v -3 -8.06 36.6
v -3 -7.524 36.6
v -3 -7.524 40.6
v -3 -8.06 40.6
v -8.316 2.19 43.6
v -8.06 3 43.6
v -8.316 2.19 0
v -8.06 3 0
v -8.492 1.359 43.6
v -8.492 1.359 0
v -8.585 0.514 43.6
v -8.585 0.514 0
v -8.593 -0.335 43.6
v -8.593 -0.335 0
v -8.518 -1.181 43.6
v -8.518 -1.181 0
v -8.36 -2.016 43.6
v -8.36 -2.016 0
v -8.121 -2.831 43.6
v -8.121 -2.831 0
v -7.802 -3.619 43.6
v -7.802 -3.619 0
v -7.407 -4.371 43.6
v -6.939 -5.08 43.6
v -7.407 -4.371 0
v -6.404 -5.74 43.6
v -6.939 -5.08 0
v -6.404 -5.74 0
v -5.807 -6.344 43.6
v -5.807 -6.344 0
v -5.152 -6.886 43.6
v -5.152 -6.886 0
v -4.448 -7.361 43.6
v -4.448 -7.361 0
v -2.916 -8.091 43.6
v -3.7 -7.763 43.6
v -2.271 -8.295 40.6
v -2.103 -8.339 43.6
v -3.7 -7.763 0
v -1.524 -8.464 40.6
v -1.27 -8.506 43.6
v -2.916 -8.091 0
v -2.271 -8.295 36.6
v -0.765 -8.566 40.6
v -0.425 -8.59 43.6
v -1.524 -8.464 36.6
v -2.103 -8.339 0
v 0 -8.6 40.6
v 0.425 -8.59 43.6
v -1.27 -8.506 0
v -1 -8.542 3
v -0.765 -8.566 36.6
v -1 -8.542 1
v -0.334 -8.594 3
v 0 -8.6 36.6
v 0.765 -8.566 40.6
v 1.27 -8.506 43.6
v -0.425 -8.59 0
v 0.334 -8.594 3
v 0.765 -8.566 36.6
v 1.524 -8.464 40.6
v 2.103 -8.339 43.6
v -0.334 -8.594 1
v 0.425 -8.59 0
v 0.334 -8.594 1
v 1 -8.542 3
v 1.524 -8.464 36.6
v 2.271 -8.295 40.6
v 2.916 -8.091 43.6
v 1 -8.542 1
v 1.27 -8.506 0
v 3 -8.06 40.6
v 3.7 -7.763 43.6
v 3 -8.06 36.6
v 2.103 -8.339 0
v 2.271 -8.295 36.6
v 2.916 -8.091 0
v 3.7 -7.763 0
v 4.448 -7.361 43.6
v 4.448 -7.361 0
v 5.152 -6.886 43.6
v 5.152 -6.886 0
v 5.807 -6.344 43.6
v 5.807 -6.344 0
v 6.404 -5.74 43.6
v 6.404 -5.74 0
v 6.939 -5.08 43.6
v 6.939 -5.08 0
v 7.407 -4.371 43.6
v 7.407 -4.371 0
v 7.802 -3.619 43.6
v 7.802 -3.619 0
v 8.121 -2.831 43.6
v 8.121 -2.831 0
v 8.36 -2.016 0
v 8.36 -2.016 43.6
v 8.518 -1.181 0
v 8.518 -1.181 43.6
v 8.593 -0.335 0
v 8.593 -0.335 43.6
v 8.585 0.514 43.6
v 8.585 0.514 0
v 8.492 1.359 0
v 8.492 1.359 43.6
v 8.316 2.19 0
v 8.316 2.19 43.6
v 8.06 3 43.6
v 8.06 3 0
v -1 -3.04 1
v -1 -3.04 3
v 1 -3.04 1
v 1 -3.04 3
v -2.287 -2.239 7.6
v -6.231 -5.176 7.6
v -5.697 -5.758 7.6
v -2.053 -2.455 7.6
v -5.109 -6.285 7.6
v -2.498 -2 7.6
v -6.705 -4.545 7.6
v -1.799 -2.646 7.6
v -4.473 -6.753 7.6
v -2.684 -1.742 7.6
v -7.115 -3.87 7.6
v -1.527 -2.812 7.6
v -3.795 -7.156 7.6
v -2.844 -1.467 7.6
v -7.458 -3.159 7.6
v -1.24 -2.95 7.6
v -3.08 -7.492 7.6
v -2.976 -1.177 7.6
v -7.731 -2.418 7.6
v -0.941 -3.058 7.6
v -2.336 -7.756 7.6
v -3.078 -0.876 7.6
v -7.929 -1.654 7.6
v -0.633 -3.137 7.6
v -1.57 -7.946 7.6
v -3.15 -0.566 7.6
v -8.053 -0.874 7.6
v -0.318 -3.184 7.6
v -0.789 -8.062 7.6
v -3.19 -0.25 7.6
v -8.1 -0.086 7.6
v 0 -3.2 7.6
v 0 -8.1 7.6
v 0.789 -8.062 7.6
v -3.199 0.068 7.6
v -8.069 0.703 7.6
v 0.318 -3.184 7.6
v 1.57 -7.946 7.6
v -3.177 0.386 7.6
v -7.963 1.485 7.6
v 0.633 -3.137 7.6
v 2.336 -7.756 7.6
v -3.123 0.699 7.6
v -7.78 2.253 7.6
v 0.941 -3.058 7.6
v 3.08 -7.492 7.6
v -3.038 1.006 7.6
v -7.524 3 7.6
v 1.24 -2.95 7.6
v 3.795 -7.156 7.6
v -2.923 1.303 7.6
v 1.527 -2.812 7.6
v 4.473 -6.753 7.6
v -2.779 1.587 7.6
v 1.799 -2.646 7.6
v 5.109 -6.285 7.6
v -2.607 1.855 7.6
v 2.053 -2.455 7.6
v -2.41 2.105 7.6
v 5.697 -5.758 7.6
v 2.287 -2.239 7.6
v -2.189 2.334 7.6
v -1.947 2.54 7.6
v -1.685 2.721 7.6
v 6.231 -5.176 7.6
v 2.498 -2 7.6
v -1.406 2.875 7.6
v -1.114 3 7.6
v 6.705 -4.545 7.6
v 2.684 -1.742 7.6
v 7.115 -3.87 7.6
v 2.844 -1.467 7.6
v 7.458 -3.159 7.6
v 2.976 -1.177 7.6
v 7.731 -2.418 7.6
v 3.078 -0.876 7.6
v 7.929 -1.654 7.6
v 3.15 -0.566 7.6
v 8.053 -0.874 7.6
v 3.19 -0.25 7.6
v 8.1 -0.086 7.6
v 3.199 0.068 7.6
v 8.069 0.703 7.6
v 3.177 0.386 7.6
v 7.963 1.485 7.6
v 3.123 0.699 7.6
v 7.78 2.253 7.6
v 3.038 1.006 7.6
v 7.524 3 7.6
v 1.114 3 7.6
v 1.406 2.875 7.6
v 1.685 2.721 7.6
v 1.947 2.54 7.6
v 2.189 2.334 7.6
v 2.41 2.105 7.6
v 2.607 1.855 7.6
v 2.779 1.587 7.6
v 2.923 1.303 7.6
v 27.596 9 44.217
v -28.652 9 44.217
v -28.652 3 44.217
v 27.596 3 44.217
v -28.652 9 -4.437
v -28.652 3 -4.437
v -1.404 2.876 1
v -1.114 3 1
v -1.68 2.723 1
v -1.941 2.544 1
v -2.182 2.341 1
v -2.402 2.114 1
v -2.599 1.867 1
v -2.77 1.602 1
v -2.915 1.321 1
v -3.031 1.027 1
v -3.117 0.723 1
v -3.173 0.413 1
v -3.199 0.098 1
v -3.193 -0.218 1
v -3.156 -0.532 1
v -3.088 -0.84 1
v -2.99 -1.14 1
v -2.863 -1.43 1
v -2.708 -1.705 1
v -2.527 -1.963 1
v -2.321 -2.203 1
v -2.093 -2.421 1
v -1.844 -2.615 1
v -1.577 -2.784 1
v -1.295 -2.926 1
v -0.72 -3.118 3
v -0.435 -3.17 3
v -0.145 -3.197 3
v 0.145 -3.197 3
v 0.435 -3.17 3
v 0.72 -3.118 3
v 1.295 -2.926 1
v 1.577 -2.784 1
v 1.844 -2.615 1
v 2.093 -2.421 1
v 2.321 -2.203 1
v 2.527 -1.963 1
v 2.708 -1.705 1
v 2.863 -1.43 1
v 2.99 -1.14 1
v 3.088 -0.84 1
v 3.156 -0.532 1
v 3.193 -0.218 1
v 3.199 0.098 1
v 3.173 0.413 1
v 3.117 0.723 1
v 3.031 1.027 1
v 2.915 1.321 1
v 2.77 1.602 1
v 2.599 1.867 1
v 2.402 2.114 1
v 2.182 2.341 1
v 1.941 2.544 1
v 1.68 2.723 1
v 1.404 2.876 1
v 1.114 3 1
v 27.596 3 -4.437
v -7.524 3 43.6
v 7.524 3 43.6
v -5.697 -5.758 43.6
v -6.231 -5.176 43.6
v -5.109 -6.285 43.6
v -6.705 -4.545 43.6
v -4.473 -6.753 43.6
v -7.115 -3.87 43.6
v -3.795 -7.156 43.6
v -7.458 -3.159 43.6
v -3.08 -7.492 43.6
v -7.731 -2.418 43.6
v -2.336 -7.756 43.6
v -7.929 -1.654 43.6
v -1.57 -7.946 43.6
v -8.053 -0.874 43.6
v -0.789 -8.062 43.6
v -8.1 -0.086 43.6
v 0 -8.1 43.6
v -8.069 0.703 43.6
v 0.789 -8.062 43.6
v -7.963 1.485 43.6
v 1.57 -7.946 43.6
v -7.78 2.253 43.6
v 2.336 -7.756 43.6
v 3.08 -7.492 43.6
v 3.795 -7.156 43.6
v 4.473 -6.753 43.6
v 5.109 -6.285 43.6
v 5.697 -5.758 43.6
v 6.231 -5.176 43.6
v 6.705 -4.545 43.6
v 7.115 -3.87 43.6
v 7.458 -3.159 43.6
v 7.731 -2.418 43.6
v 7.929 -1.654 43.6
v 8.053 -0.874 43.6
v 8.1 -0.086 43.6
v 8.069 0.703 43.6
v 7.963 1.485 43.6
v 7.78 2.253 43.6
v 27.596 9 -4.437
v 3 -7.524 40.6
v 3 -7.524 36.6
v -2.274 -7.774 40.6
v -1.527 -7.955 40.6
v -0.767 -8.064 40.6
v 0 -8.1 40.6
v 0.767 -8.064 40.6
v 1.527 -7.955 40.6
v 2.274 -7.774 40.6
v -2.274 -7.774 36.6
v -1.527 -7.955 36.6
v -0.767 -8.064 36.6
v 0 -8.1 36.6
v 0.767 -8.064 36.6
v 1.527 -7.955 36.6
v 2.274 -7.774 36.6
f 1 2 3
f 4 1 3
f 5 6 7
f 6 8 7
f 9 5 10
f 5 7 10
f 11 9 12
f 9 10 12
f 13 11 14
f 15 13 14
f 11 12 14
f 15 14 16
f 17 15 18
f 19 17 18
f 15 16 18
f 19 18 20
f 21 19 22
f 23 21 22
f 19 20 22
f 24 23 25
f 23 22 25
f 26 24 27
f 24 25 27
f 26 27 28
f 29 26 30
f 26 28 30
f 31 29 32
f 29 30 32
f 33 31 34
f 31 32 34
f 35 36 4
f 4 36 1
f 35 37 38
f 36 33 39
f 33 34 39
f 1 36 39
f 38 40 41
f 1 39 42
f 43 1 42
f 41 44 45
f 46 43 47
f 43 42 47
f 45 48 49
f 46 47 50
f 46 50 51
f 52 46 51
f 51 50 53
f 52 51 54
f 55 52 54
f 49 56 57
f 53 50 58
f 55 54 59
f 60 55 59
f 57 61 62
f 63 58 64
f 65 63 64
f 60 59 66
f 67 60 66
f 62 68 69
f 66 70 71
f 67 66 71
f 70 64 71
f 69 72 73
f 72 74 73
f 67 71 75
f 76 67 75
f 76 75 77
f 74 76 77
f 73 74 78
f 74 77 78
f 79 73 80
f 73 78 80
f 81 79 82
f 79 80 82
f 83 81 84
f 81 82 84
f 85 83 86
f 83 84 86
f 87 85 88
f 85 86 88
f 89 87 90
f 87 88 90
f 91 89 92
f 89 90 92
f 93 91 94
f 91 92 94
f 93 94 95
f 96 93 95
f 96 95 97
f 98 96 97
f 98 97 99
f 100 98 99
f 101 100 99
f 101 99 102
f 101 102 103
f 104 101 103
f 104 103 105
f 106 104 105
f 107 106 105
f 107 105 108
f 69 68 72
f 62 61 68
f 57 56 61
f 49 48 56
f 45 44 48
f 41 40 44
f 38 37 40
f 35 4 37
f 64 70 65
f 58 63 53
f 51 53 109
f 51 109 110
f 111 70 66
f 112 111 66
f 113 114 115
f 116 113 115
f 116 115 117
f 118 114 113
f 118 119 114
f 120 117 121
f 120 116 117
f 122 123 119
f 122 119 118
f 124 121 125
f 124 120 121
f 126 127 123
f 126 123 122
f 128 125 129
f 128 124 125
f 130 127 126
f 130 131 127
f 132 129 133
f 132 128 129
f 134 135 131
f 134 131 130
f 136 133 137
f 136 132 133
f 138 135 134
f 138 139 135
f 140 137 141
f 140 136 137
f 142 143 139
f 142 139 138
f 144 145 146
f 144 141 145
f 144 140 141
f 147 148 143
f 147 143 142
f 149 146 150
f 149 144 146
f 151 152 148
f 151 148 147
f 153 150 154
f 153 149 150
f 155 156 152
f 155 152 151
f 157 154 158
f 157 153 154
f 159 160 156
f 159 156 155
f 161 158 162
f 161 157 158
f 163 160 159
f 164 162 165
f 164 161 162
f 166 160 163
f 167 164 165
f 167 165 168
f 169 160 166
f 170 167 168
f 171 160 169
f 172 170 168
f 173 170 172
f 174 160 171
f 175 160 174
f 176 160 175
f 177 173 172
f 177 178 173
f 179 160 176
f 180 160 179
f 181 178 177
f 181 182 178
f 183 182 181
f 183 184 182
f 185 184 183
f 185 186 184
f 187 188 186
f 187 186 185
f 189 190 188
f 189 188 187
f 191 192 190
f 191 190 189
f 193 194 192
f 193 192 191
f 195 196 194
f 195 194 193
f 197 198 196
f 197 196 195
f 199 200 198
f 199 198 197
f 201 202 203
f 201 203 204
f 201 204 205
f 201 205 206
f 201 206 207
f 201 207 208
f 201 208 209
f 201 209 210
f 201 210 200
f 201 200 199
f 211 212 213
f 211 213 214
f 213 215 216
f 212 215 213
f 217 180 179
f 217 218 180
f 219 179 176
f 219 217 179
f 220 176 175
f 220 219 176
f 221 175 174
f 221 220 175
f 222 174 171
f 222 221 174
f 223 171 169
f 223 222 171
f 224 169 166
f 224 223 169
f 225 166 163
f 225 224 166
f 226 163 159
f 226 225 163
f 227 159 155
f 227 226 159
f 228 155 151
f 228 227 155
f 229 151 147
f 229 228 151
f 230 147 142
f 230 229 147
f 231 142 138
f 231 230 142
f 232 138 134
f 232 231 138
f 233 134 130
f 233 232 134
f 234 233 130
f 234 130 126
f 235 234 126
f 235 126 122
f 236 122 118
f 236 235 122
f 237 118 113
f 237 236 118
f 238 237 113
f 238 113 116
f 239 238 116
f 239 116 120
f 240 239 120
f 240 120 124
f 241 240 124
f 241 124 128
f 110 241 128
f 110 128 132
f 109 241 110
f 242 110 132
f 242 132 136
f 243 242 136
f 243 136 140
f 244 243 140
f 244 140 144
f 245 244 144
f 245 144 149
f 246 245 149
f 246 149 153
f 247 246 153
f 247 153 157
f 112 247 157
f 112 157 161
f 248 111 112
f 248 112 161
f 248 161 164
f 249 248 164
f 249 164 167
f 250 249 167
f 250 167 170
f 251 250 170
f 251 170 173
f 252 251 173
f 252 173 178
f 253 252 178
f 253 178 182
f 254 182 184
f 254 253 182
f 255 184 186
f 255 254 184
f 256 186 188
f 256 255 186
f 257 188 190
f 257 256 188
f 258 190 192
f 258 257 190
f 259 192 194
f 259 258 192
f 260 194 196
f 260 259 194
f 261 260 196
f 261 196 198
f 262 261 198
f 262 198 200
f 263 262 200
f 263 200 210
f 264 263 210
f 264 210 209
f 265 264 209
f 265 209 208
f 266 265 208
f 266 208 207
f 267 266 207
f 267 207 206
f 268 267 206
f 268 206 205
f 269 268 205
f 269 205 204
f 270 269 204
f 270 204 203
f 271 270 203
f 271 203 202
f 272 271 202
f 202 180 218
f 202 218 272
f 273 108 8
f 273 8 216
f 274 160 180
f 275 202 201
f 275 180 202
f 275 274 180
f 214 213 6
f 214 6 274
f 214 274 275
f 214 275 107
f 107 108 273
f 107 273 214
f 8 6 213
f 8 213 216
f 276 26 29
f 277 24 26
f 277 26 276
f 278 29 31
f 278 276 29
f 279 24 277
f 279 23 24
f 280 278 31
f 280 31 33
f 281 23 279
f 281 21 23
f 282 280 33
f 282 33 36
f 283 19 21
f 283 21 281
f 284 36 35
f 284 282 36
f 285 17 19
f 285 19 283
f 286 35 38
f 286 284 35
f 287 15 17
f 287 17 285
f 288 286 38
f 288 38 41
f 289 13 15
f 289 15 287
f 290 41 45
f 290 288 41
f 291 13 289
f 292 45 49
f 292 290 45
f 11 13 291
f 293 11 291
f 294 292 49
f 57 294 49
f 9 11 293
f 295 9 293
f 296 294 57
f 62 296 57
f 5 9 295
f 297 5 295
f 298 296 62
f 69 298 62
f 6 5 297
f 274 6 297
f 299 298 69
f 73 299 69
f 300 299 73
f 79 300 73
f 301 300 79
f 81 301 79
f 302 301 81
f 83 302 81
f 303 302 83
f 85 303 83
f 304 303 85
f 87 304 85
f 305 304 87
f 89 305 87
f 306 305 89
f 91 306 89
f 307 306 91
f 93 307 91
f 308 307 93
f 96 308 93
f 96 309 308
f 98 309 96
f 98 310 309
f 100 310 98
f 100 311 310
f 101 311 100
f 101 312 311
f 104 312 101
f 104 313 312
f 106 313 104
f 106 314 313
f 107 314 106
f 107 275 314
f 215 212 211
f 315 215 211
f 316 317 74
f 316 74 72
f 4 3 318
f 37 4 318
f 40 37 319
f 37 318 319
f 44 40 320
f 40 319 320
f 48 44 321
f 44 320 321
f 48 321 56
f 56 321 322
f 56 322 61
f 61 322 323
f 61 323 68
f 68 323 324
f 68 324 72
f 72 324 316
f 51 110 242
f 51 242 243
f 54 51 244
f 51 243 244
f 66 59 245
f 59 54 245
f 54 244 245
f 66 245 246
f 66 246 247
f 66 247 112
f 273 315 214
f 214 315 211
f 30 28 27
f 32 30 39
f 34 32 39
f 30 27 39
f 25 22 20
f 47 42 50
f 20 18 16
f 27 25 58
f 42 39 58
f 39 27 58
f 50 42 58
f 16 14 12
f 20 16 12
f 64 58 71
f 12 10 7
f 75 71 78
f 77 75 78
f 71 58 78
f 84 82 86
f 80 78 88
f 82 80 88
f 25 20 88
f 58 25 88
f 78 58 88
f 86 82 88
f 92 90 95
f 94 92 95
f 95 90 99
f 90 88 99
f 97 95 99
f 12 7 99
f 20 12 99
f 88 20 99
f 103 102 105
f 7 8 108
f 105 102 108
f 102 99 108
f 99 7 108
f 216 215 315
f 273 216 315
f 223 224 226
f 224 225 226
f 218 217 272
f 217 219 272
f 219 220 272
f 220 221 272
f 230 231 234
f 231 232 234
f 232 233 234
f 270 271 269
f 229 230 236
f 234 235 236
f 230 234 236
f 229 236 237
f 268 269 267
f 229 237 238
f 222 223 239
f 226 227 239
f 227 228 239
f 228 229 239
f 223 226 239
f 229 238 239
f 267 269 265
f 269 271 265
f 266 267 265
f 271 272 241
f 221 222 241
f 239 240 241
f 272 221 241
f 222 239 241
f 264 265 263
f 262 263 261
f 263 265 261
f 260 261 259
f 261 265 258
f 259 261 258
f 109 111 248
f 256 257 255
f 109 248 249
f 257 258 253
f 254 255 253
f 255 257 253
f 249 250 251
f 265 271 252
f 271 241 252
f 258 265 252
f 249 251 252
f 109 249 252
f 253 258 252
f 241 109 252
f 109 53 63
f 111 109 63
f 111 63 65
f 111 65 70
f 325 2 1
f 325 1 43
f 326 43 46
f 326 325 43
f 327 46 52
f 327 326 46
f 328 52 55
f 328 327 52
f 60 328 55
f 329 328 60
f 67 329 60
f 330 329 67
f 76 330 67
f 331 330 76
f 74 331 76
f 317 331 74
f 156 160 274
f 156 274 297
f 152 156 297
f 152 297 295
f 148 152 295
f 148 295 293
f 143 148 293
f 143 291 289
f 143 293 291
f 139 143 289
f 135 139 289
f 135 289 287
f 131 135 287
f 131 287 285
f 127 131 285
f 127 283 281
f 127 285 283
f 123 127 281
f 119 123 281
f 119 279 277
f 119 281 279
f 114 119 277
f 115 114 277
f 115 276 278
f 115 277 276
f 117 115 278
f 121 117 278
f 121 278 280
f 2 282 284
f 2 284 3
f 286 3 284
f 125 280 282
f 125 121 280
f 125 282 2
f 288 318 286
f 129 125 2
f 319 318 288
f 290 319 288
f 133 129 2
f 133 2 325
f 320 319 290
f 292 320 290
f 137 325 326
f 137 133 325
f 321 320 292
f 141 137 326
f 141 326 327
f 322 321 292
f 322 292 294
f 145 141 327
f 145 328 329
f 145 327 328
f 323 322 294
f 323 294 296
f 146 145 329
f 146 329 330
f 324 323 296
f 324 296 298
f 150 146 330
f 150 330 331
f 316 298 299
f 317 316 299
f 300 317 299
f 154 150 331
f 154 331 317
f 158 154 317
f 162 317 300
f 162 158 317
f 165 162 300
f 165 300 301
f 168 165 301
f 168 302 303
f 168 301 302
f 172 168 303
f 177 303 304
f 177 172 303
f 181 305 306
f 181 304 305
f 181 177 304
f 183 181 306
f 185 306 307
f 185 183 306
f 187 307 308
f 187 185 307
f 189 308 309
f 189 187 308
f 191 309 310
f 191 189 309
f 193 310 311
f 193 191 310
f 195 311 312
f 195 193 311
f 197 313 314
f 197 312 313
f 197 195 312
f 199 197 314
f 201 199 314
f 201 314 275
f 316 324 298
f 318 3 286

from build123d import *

# Parameters (mm, degrees)
SKETCH_R             = 8.6
PAD_DEPTH            = 1
SKETCH001_R          = 8.6
SKETCH001_R_2        = 3.2
PAD001_DEPTH         = 6.6
SKETCH002_W          = 2
SKETCH002_H          = 2
POCKET_DEPTH         = 8.601
POCKET_DEPTH_BACK    = -8.601
SKETCH003_R          = 8.6
SKETCH003_R_2        = 8.1
PAD002_DEPTH         = 36
SKETCH004_W          = 6
SKETCH004_H          = 4
POCKET001_DEPTH      = 8.601
POCKET001_DEPTH_BACK = -8.601
SKETCH006_W          = 56.248293
SKETCH006_H          = 48.654014
PAD003_DEPTH         = 6


with BuildPart() as part:
    # Sketch → Pad (new body)
    with BuildSketch(Plane.XY):
        Circle(SKETCH_R)
    extrude(amount=PAD_DEPTH)

    # Sketch001 (on Face3 of Pad) → Pad001 (join)
    with BuildSketch(Plane.XY.offset(1)):
        Circle(SKETCH001_R)
        Circle(SKETCH001_R_2, mode=Mode.SUBTRACT)
    extrude(amount=PAD001_DEPTH)

    # Sketch002 → Pocket (cut, two sides)
    with BuildSketch(Plane.XZ) as pocket_sk:
        with Locations((0, 2)):
            Rectangle(SKETCH002_W, SKETCH002_H)
    extrude(amount=-POCKET_DEPTH, mode=Mode.SUBTRACT)
    extrude(pocket_sk.sketch, amount=-POCKET_DEPTH_BACK, mode=Mode.SUBTRACT)

    # Sketch003 (on Face12 of Pocket) → Pad002 (join)
    with BuildSketch(Plane.XY.offset(7.6)):
        Circle(SKETCH003_R)
        Circle(SKETCH003_R_2, mode=Mode.SUBTRACT)
    extrude(amount=PAD002_DEPTH)

    # Sketch004 → Pocket001 (cut, two sides)
    with BuildSketch(Plane.XZ) as pocket001_sk:
        with Locations((0, 38.6)):
            Rectangle(SKETCH004_W, SKETCH004_H)
    extrude(amount=-POCKET001_DEPTH, mode=Mode.SUBTRACT)
    extrude(pocket001_sk.sketch, amount=-POCKET001_DEPTH_BACK, mode=Mode.SUBTRACT)

    # Sketch006 (on DatumPlane) → Pad003 (join)
    with BuildSketch(Plane.XZ.offset(-9)):
        with Locations((-0.52784, 19.889832)):
            Rectangle(SKETCH006_W, SKETCH006_H)
    extrude(amount=PAD003_DEPTH)


solid = part.part
